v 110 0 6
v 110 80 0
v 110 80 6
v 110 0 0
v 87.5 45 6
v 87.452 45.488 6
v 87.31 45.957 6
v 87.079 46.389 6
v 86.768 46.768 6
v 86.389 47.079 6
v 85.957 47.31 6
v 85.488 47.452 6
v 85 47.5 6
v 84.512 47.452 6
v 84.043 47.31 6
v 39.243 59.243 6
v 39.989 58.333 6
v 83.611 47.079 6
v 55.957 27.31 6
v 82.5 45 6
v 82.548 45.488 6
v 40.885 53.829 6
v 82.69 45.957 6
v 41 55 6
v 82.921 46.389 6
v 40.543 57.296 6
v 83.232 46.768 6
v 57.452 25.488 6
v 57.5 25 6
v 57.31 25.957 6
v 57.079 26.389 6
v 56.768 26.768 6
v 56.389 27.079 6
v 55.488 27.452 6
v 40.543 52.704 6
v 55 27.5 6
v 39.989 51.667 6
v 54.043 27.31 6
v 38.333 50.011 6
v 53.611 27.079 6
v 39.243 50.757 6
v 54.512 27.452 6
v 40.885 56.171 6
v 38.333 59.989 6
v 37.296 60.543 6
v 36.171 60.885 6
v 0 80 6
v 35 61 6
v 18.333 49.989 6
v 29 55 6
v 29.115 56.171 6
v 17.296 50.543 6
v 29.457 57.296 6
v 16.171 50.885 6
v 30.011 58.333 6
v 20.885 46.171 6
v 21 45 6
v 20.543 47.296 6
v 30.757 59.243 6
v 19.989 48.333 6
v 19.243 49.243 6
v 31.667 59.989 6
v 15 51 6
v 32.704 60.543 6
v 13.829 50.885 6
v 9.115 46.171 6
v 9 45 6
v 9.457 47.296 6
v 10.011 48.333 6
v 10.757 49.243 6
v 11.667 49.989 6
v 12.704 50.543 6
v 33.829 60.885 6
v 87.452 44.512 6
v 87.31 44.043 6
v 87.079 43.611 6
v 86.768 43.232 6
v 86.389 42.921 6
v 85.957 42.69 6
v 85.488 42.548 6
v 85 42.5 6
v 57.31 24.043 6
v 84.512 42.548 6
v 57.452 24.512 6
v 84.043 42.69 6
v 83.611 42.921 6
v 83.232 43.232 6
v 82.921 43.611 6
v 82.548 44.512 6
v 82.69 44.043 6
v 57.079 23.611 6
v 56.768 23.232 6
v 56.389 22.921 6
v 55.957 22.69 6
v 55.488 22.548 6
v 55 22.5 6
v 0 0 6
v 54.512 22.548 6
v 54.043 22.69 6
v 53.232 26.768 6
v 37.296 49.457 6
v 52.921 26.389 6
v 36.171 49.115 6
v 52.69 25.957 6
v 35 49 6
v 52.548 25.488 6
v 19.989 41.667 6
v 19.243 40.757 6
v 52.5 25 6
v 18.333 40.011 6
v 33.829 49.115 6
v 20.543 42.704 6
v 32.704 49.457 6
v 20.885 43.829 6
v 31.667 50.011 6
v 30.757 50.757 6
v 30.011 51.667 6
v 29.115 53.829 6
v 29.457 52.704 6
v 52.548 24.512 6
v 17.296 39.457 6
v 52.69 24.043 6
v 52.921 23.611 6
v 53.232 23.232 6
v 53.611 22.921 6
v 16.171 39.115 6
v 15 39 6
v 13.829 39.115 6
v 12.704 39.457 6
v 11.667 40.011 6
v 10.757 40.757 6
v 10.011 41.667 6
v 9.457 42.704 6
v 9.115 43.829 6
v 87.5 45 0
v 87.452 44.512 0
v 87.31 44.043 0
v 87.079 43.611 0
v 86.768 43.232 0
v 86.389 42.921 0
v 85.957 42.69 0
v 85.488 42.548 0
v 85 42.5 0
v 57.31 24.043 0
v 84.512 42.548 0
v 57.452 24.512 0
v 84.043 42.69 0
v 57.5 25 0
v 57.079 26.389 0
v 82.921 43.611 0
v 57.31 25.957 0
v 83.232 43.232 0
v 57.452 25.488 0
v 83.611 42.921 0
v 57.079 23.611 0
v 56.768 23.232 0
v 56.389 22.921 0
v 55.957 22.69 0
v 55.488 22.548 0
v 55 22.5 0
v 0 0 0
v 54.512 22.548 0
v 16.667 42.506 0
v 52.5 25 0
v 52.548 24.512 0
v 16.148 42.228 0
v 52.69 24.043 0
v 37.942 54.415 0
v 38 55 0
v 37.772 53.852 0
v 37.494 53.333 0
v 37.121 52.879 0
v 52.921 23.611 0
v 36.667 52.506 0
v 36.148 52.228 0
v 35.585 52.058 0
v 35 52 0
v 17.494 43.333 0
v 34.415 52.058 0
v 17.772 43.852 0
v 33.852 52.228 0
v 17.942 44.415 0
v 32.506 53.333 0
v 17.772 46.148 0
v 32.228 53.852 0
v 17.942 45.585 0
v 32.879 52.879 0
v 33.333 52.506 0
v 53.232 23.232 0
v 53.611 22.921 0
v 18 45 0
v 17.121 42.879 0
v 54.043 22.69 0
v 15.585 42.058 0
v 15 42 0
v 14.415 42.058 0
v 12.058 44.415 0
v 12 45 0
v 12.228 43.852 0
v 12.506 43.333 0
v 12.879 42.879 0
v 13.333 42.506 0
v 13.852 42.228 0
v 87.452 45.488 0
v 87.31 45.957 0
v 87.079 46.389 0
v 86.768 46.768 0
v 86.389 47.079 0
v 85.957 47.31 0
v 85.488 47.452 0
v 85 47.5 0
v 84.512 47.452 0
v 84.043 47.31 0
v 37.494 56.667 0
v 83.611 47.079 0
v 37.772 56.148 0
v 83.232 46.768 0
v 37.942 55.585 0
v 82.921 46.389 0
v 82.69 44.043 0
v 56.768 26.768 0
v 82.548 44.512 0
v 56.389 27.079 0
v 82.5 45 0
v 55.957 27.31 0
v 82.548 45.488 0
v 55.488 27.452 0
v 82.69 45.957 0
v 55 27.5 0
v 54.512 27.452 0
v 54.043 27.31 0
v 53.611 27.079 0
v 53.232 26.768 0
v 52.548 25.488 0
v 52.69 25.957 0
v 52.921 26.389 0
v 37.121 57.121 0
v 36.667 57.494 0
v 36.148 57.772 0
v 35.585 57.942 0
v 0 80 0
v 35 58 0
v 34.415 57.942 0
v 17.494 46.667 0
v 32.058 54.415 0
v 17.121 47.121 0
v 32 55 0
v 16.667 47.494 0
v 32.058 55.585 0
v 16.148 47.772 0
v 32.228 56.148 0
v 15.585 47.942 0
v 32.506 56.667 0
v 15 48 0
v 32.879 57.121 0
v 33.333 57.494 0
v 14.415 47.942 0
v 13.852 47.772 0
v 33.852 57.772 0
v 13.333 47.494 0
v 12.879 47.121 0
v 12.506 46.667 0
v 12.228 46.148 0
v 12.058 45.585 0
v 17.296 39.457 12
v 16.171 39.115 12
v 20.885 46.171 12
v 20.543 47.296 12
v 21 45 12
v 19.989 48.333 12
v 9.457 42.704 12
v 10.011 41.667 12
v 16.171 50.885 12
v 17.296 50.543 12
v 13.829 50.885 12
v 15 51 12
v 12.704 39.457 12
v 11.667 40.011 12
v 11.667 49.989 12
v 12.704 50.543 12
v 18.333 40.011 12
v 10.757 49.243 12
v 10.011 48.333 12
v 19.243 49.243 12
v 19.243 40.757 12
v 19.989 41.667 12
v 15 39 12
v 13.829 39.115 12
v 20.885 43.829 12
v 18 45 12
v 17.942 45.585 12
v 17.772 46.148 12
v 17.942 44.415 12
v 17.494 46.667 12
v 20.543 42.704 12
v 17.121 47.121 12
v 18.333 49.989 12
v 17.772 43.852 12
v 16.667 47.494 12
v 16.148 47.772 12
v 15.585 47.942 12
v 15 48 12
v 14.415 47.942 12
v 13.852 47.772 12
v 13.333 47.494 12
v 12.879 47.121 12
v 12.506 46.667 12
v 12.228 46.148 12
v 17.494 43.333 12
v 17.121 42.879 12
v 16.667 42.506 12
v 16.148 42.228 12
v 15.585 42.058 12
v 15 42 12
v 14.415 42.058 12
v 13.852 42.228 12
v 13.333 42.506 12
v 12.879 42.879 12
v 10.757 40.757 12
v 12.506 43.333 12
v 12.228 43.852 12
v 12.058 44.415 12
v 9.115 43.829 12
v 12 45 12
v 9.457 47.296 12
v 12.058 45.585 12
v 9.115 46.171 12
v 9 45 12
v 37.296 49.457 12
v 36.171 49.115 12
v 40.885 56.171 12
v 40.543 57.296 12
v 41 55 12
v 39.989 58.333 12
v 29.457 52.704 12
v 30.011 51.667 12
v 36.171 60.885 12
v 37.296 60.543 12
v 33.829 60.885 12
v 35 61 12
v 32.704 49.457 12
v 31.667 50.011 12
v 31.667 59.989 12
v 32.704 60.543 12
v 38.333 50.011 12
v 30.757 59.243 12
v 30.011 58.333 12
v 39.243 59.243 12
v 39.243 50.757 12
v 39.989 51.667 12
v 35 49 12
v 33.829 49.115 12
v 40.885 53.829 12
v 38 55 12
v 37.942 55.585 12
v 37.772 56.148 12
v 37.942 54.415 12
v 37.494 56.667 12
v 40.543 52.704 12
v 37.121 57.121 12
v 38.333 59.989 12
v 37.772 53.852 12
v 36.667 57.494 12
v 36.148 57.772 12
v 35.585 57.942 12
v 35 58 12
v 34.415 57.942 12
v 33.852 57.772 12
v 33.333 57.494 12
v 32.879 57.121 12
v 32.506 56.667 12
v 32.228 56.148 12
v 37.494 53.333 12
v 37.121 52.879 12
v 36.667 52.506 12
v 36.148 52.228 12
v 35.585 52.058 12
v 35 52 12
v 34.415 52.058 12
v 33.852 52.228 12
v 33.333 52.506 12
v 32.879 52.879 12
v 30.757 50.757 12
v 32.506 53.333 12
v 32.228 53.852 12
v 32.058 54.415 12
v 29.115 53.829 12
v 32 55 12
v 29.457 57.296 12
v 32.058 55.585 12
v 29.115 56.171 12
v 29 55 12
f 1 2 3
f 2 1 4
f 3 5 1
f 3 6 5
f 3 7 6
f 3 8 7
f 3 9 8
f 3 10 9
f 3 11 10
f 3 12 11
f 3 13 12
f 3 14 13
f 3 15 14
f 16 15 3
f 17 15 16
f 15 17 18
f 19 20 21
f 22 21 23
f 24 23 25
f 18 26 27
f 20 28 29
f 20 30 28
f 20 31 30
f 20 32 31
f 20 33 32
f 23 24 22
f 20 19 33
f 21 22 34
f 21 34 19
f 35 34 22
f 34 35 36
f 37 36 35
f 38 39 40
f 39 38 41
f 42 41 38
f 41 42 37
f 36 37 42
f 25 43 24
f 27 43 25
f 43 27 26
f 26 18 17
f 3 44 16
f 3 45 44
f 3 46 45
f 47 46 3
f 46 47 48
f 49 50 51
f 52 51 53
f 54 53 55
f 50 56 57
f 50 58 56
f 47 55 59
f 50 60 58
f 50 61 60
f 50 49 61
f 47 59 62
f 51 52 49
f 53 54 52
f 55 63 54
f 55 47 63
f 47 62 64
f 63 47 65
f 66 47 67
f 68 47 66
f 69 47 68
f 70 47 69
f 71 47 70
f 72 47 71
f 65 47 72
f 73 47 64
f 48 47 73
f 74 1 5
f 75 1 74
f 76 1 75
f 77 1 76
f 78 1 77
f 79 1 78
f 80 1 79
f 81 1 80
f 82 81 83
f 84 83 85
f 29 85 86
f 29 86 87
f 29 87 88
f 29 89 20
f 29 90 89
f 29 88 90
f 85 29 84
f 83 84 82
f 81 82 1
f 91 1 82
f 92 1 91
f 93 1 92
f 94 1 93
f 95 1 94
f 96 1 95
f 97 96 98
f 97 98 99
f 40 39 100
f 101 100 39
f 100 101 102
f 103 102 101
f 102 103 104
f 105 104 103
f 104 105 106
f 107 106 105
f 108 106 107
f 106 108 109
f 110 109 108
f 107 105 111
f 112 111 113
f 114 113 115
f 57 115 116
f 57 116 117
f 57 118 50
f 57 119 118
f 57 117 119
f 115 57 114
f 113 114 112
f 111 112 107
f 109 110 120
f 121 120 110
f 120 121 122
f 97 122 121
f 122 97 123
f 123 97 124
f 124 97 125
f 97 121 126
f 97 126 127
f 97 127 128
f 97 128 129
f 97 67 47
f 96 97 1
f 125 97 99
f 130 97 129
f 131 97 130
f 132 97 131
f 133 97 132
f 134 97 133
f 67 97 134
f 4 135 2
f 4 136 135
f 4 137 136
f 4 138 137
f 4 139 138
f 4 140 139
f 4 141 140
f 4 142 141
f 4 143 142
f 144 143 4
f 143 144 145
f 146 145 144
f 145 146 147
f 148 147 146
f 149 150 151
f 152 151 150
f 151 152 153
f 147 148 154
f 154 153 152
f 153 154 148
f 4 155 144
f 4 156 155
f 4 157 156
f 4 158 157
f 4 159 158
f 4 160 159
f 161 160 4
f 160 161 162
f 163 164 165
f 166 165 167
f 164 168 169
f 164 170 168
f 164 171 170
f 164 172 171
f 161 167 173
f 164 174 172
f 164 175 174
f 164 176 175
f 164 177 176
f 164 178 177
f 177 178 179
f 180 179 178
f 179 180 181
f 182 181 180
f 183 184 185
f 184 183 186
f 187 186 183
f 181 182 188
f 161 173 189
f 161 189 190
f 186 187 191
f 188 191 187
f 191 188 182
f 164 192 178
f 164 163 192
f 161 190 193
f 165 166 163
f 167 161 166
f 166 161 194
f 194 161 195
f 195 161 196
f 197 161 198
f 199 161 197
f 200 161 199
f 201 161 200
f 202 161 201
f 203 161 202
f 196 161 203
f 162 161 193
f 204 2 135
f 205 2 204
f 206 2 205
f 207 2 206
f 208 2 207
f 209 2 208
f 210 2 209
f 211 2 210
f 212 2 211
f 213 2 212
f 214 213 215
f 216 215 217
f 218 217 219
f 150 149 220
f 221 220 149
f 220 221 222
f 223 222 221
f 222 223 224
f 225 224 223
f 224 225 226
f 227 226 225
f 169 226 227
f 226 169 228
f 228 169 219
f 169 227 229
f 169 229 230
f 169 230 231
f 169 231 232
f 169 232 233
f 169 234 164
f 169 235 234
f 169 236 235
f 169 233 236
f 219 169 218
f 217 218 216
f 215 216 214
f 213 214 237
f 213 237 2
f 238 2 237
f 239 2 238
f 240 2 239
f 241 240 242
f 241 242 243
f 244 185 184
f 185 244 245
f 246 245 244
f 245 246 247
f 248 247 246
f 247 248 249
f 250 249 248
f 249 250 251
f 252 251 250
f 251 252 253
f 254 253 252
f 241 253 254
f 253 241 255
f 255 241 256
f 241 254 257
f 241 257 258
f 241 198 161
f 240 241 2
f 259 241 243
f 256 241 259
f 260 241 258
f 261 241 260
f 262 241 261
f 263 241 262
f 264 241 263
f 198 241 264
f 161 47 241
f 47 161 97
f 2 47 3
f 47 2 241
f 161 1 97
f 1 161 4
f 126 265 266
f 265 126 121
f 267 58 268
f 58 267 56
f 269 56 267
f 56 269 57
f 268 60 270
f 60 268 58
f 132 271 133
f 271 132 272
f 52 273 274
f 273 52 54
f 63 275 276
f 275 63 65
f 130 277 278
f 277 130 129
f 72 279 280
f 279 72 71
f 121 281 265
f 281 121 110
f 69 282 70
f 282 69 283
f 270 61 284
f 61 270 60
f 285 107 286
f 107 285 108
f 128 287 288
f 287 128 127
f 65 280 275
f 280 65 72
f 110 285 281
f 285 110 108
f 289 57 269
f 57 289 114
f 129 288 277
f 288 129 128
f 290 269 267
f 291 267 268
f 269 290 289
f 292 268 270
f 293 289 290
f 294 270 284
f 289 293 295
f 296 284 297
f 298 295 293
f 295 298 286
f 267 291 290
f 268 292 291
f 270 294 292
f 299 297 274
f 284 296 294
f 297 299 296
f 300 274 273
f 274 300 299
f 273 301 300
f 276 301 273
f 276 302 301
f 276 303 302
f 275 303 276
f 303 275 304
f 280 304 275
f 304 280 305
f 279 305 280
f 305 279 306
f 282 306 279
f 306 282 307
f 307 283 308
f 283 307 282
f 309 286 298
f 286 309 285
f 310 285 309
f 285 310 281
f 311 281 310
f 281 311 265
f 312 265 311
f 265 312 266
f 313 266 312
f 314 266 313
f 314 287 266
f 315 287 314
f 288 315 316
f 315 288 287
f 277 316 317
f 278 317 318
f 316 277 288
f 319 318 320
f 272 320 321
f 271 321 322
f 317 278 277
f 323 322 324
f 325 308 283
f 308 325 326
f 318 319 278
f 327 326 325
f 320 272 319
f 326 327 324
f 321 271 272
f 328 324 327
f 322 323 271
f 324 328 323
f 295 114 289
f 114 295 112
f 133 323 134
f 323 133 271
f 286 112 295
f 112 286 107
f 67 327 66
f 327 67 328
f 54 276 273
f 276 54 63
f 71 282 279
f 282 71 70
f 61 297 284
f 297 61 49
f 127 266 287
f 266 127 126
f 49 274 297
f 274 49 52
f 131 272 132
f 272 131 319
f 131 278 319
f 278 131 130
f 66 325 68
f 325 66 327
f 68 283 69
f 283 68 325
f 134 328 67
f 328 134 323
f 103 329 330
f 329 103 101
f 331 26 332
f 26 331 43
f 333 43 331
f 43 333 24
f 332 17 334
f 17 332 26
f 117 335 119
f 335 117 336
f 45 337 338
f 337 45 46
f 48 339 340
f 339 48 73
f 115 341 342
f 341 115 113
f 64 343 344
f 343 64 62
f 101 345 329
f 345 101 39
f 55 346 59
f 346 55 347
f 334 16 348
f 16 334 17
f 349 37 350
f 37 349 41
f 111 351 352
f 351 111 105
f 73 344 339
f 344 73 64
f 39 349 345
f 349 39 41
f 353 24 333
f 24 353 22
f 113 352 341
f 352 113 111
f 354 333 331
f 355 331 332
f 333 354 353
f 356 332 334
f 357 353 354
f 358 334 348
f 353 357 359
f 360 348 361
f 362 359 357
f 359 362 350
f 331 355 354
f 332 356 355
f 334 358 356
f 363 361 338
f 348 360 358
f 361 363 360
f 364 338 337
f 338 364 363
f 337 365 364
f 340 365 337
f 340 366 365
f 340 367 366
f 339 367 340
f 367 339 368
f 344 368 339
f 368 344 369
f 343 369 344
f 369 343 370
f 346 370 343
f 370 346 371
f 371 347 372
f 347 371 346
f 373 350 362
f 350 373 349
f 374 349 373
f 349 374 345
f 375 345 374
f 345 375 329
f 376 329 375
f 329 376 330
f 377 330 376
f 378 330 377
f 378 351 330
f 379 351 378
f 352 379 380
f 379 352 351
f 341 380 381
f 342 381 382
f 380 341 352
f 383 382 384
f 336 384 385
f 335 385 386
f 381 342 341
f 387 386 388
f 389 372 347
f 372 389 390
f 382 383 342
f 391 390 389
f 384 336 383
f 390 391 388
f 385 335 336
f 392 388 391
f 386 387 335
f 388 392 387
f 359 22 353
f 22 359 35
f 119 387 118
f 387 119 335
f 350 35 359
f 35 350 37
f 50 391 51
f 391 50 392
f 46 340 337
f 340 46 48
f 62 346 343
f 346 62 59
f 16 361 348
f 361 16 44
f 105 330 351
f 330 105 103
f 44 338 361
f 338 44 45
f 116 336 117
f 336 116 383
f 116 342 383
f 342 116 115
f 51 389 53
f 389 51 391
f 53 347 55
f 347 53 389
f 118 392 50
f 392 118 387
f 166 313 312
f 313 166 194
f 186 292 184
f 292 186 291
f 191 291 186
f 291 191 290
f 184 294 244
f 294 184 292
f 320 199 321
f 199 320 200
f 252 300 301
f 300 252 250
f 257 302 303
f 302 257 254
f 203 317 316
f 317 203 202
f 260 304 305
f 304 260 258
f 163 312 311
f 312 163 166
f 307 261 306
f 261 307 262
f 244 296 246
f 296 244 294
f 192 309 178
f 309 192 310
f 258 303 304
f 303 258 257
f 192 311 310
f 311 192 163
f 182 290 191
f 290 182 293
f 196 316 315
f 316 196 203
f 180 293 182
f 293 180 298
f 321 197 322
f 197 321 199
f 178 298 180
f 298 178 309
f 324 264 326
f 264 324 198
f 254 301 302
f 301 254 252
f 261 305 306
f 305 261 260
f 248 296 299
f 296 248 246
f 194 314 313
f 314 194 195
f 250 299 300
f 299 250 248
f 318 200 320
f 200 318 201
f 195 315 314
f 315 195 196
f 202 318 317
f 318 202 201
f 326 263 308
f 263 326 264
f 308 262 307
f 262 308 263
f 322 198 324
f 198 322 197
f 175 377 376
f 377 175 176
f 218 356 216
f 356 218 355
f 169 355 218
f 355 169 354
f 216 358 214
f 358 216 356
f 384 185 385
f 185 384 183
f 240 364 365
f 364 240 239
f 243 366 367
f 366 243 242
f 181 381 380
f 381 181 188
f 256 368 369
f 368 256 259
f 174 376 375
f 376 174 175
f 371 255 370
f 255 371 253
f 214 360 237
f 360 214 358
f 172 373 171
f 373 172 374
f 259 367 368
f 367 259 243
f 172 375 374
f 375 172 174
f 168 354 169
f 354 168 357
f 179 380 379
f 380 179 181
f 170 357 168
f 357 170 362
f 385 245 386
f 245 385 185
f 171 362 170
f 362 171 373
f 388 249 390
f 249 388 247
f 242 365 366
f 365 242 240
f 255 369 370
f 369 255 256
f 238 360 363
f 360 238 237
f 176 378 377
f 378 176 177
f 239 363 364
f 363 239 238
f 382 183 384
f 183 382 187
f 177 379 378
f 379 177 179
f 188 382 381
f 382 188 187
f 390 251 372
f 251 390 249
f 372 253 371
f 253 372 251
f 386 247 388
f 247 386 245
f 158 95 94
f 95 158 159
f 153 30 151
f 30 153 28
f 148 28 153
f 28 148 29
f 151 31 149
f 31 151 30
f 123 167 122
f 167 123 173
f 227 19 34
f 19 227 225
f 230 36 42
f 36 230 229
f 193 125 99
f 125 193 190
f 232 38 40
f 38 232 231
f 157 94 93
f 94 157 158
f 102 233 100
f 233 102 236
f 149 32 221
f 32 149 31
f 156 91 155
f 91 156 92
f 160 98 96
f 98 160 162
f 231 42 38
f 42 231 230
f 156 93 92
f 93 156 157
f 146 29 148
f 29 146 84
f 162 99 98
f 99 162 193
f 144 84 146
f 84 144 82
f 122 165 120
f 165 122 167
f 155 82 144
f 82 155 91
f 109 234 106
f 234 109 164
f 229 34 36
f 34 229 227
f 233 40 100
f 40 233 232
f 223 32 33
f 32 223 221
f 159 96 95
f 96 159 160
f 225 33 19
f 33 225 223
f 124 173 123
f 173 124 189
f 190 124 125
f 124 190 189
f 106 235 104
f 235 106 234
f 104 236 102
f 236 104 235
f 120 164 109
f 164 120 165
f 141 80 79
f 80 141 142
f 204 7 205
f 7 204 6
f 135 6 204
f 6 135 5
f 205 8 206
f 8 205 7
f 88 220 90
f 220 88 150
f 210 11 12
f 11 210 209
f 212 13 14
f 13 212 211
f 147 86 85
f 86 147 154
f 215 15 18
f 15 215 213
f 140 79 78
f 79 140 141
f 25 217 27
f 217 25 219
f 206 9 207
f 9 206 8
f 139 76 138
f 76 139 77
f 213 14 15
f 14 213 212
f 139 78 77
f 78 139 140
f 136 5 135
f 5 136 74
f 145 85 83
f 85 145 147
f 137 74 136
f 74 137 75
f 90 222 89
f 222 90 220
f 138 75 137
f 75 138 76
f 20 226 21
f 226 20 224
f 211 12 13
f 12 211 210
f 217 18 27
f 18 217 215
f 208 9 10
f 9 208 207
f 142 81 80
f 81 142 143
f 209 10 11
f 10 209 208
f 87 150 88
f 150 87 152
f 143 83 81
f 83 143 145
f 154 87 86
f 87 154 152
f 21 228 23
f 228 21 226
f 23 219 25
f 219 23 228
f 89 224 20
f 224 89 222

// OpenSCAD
$fn = 32;

// ----------------------------------------------------------------------
// Mixed field: bosses and holes at given coordinates
// ----------------------------------------------------------------------

// --- parameters (mm) ---
plate_l = 110;            // plate length, X
plate_w = 80;             // plate width, Y
plate_t = 6;              // plate thickness, Z
boss_d = 12;              // boss diameter
boss_h = 6;               // boss height above the plate
hole_d = 5;               // through hole diameter

total_h = plate_t + boss_h;  // overall height

difference() {
  union() {
    cube([plate_l, plate_w, plate_t]);
    translate([15, 45, plate_t]) cylinder(h = boss_h, d = boss_d);
    translate([35, 55, plate_t]) cylinder(h = boss_h, d = boss_d);
  }
  translate([15, 45, -1]) cylinder(h = total_h + 2, d = boss_d / 2);
  translate([35, 55, -1]) cylinder(h = total_h + 2, d = boss_d / 2);
  translate([55, 25, -1]) cylinder(h = plate_t + 2, d = hole_d);
  translate([85, 45, -1]) cylinder(h = plate_t + 2, d = hole_d);
}
